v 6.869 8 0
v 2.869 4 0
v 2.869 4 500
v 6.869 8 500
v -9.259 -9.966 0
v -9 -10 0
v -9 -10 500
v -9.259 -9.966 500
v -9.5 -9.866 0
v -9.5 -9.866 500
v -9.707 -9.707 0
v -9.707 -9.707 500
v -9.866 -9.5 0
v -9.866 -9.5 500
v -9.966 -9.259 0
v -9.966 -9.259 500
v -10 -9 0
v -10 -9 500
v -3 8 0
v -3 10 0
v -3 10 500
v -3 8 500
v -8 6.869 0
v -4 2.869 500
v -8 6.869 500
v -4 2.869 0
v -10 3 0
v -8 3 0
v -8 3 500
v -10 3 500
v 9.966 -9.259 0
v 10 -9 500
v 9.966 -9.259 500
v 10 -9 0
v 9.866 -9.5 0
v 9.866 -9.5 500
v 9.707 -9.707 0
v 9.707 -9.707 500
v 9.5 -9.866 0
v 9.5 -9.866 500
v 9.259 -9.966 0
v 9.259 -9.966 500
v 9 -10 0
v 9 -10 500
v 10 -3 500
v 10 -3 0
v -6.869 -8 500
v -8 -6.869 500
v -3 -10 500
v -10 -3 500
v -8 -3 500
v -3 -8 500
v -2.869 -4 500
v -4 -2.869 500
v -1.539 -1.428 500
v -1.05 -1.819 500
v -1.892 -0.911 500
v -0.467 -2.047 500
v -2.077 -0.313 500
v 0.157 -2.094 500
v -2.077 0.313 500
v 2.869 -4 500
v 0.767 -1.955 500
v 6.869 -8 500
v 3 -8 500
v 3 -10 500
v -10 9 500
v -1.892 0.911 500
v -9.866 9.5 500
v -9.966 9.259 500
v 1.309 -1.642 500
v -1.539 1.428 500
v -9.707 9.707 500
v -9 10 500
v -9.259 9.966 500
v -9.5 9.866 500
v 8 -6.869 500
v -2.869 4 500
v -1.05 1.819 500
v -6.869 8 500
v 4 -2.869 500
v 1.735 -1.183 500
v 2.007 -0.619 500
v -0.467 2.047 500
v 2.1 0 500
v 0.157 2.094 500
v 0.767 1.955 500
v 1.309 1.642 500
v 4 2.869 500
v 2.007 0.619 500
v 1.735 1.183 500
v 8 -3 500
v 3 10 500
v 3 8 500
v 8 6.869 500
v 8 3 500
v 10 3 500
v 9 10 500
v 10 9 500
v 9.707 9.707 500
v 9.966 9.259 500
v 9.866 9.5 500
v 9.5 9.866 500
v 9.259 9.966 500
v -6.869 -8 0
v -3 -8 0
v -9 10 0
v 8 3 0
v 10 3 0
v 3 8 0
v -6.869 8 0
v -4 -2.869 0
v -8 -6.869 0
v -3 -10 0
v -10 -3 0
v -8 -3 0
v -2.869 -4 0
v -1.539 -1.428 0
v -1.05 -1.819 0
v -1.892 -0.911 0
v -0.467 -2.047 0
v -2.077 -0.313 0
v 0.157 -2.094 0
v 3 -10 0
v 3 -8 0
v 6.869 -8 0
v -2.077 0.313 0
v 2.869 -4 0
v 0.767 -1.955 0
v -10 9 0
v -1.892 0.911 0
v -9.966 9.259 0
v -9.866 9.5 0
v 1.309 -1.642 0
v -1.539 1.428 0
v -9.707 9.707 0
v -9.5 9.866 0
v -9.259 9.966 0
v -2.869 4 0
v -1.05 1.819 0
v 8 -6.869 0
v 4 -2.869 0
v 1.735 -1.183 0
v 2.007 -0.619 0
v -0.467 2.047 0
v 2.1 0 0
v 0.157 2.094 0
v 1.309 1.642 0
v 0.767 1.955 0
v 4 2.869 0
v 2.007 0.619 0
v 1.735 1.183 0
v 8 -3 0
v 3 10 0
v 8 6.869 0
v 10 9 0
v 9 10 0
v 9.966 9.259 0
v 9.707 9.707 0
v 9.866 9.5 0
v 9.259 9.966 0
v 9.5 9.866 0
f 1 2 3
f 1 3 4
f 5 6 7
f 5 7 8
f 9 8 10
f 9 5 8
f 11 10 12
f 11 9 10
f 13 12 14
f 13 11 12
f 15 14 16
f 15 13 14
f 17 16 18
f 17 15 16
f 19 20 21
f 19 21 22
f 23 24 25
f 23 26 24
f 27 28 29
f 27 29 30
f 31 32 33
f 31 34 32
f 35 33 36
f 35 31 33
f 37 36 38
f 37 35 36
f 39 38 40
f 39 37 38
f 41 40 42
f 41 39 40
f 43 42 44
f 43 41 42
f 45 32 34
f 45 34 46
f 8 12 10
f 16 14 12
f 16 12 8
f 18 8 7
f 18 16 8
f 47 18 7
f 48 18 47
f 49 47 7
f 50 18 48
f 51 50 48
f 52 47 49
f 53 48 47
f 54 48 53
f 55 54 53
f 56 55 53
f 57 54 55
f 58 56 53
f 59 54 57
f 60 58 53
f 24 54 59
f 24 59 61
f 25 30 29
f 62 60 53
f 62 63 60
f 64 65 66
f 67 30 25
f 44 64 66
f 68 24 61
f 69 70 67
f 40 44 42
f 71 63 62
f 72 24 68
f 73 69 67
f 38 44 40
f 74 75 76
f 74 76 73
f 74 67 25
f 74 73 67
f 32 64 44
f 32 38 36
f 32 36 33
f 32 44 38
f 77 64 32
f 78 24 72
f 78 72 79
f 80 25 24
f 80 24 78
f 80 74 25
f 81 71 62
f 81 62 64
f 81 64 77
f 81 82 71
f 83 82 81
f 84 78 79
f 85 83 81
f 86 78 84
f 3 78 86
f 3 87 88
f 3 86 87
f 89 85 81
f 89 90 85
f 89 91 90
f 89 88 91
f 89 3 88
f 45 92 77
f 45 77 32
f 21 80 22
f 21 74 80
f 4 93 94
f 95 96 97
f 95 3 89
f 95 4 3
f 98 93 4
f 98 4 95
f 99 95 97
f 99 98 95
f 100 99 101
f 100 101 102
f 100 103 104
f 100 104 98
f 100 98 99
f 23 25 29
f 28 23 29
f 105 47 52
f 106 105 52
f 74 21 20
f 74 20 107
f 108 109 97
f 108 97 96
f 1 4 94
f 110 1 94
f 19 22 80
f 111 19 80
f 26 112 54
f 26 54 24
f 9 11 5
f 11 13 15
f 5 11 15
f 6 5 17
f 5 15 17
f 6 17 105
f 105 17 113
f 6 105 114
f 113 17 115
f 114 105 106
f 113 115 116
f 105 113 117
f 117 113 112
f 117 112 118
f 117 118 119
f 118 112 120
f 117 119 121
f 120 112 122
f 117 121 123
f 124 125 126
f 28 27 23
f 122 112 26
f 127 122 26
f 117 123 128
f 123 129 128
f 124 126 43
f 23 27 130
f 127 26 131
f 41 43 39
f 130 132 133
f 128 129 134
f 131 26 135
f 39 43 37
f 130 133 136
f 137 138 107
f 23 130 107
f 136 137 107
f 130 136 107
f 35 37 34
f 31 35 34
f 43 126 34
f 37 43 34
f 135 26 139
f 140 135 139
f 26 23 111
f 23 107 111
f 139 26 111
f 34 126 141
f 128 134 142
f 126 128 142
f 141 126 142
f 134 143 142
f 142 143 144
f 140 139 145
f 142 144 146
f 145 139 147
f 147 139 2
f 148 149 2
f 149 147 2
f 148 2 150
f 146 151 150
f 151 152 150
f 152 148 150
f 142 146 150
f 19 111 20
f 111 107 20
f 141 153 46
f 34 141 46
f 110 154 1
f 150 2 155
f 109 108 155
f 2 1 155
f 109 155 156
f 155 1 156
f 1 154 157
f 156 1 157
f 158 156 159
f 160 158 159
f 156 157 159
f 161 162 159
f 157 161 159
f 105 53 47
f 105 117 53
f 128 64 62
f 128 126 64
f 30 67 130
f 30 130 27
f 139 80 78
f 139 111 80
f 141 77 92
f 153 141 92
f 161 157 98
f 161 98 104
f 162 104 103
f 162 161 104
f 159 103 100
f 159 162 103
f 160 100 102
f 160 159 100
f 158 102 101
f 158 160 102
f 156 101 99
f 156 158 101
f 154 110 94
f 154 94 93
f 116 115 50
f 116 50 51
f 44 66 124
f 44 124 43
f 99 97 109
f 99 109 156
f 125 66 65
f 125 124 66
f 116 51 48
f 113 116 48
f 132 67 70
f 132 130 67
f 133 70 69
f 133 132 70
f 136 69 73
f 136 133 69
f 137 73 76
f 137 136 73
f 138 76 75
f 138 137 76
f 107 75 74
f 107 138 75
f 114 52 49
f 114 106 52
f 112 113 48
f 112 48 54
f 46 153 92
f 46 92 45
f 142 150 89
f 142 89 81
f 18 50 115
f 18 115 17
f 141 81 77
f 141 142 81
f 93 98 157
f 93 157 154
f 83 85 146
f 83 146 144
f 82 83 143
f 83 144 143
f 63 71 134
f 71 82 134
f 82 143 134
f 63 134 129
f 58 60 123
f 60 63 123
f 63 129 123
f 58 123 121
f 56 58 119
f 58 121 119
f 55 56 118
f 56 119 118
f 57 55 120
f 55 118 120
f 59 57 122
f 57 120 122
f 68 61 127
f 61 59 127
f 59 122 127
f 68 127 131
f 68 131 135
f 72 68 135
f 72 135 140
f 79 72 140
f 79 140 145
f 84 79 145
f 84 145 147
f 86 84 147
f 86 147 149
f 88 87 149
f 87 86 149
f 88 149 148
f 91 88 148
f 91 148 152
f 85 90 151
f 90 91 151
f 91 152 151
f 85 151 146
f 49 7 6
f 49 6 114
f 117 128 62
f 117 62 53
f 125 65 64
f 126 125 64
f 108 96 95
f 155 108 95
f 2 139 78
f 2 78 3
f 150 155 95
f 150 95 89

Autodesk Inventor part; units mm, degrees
ref_plane "YZ Plane" through (0, 0, 0) normal (1, 0, 0) x (0, 1, 0)
ref_plane "XZ Plane" through (0, 0, 0) normal (0, 1, 0) x (-1, 0, 0)
ref_plane "XY Plane" through (0, 0, 0) normal (0, 0, 1) x (1, 0, 0)
sketch "スケッチ1" plane through (0, 0, 0) normal (0, 0, 1) x (1, 0, 0)
  line L0 (-10, -10) -> (10, 10) construction
  line L1 (10, -10) -> (-10, 10) construction
  line L2 (10, 3) -> (8, 3)
  line L3 (8, 3) -> (8, 6.8686)
  line L4 (8, 6.8686) -> (4, 2.8686)
  line L5 (4, 2.8686) -> (4, -2.8686)
  line L6 (4, -2.8686) -> (8, -6.8686)
  line L7 (8, -6.8686) -> (8, -3)
  line L8 (8, -3) -> (10, -3)
  line L9 (-10, 0) -> (10, 0) construction
  line L10 (-3, 10) -> (-3, 8)
  line L11 (-3, 8) -> (-6.8686, 8)
  line L12 (-6.8686, 8) -> (-2.8686, 4)
  line L13 (-2.8686, 4) -> (2.8686, 4)
  line L14 (3, 8) -> (3, 10)
  line L15 (2.8686, 4) -> (6.8686, 8)
  line L16 (6.8686, 8) -> (3, 8)
  line L17 (-10, -3) -> (-8, -3)
  line L18 (-8, -3) -> (-8, -6.8686)
  line L19 (-8, -6.8686) -> (-4, -2.8686)
  line L20 (-4, -2.8686) -> (-4, 2.8686)
  line L21 (-8, 3) -> (-10, 3)
  line L22 (-4, 2.8686) -> (-8, 6.8686)
  line L23 (-8, 6.8686) -> (-8, 3)
  line L24 (3, -10) -> (3, -8)
  line L25 (3, -8) -> (6.8686, -8)
  line L26 (6.8686, -8) -> (2.8686, -4)
  line L27 (2.8686, -4) -> (-2.8686, -4)
  line L28 (-3, -8) -> (-3, -10)
  line L29 (-2.8686, -4) -> (-6.8686, -8)
  line L30 (-6.8686, -8) -> (-3, -8)
  line L31 (9, 10) -> (3, 10)
  line L32 (-3, 10) -> (-9, 10)
  line L33 (-10, 9) -> (-10, 3)
  line L34 (-10, -3) -> (-10, -9)
  line L35 (-9, -10) -> (-3, -10)
  line L36 (3, -10) -> (9, -10)
  line L37 (10, -9) -> (10, -3)
  line L38 (10, 3) -> (10, 9)
  circle A0 centre (0, 0) radius 2.1
  arc A1 (-9, 10) -> (-10, 9) centre (-9, 9) ccw
  arc A2 (-10, -9) -> (-9, -10) centre (-9, -9) ccw
  arc A3 (9, -10) -> (10, -9) centre (9, -9) ccw
  arc A4 (10, 9) -> (9, 10) centre (9, 9) ccw
  point P0 (0, 10)
  point P1 (-10, 0)
  point P2 (0, -10)
  dimension "d0" = 2
  dimension "d1" = 6
  dimension "d2" = 4
  dimension "d3" = 0.8
  dimension "d9" = 20
  dimension "d10" = 4.2
  dimension "d11" = 1
extrude "押し出し1" add sketch "スケッチ1" along normal blind 500
properties part number "高剛性フレーム"
